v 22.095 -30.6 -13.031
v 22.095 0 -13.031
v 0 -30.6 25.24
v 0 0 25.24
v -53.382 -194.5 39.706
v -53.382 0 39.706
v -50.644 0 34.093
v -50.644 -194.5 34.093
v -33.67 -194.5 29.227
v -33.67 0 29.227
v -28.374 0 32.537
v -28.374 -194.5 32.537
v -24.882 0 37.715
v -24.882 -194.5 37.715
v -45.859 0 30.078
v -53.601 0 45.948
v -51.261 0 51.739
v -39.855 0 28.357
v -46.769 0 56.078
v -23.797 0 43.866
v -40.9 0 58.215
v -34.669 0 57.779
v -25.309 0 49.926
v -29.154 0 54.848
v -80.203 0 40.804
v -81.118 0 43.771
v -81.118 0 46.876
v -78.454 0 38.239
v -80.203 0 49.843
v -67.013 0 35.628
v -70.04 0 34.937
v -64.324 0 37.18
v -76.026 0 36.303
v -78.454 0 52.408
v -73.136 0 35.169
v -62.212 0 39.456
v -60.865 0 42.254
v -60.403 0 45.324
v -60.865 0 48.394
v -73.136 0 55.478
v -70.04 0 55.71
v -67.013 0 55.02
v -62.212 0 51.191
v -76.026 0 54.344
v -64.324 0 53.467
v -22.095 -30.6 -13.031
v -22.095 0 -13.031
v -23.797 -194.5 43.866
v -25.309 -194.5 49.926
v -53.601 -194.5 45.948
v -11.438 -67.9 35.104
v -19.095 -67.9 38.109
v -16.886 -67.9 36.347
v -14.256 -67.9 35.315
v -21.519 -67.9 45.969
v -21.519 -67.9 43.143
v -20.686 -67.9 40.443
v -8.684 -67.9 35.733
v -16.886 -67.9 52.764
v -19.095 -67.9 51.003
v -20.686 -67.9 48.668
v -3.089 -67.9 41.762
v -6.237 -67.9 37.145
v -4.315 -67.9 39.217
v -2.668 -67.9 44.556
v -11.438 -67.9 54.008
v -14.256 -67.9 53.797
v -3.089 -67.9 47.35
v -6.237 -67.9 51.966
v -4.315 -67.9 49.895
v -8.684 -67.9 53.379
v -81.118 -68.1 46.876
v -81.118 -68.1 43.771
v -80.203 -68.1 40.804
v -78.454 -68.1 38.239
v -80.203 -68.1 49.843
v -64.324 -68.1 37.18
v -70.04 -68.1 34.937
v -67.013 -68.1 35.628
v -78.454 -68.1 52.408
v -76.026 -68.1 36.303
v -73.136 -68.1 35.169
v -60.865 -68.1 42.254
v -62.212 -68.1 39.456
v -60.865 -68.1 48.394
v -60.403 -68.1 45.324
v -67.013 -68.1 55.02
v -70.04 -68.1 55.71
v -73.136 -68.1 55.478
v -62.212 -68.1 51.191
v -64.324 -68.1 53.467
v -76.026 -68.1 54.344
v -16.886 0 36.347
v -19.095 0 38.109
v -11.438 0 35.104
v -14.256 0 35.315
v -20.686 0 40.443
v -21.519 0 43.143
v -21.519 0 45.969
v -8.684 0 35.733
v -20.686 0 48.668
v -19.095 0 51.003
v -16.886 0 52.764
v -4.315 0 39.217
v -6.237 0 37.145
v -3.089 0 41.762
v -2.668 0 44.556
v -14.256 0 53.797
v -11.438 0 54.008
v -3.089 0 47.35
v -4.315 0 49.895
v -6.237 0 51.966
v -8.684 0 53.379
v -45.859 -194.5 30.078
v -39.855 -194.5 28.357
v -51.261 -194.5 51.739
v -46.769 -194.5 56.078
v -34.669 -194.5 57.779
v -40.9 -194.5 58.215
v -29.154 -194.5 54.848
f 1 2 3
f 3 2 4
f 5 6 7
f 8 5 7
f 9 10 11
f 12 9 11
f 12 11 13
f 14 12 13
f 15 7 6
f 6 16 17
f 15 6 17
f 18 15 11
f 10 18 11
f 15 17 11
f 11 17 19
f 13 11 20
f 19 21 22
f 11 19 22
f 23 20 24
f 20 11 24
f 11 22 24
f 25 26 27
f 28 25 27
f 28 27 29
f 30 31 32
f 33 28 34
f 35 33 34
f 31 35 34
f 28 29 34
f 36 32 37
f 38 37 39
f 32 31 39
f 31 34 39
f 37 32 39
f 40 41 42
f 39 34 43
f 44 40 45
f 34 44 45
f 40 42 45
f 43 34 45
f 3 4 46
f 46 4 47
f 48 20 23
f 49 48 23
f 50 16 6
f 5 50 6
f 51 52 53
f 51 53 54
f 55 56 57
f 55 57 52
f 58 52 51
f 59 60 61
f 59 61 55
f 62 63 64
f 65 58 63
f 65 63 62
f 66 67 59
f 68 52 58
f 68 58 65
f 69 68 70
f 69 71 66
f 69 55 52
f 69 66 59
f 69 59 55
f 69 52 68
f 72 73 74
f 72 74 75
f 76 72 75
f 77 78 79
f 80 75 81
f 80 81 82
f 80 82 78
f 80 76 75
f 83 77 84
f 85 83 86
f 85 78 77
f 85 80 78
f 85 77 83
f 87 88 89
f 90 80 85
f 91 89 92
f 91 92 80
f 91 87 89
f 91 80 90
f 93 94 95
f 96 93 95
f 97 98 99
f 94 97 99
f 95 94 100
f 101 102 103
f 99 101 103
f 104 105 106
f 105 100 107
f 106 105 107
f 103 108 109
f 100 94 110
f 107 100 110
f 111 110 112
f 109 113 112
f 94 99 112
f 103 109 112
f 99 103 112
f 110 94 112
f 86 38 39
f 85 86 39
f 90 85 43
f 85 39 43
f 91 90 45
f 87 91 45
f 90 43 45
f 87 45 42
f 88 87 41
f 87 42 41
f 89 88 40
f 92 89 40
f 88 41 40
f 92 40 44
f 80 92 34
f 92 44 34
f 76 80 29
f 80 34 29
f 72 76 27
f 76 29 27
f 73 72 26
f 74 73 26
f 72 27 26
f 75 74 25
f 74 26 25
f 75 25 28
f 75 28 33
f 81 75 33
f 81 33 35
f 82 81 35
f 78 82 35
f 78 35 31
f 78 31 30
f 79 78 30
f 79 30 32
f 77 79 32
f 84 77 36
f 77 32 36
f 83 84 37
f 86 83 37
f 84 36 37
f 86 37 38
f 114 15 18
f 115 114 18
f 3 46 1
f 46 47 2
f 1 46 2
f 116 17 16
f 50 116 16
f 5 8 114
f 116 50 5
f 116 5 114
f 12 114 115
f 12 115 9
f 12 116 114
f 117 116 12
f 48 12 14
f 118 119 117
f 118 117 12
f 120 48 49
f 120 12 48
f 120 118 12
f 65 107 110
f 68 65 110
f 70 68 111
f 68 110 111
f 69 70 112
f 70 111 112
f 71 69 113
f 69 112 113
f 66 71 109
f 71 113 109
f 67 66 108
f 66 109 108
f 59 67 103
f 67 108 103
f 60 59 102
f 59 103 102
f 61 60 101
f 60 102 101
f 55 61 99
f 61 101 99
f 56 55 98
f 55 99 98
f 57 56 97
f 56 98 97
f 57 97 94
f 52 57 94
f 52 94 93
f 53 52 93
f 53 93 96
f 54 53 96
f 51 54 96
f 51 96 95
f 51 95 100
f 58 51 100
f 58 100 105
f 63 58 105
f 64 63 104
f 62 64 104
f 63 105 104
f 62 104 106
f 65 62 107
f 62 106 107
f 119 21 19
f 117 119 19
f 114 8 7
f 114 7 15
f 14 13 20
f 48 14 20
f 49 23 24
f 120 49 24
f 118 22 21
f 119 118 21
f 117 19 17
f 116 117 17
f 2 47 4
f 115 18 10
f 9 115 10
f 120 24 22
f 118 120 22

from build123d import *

# Parameters (mm, degrees)
F1_DEPTH = 30.6
F3_DEPTH = 194.5
F4_R     = 10.415838
F5_DEPTH = 68.1
F6_R     = 9.478308
F7_DEPTH = 67.9


with BuildPart() as f1:
    # F0 (on Front) → F1 (new body)
    with BuildSketch(Plane.XZ):
        Polygon((0, 25.239646), (-22.095323, -13.030576), (22.095323, -13.030576), align=None)
    extrude(amount=F1_DEPTH)


with BuildPart() as f3:
    # F2 (on Front) → F3 (new body)
    with BuildSketch(Plane.XZ):
        Polygon((-28.373837, 32.536801), (-24.881561, 37.714999), (-23.797372, 43.865956), (-25.308735, 49.926113), (-29.154323, 54.847616), (-34.669197, 57.779491), (-40.899786, 58.214791), (-46.768765, 56.078248), (-51.261334, 51.73929), (-53.600687, 45.948163), (-53.382328, 39.706204), (-50.644014, 34.092705), (-45.859224, 30.078292), (-39.855292, 28.357092), (-33.670352, 29.226717), align=None)
    extrude(amount=F3_DEPTH)


with BuildPart() as f5:
    # F4 (on Front) → F5 (new body)
    with BuildSketch(Plane.XZ):
        with Locations((-70.81835, 45.323744)):
            Circle(F4_R)
    extrude(amount=F5_DEPTH)


with BuildPart() as f7:
    # F6 (on Front) → F7 (new body)
    with BuildSketch(Plane.XZ):
        with Locations((-12.146698, 44.555921)):
            Circle(F6_R)
    extrude(amount=F7_DEPTH)


solid = Compound([f1.part, f3.part, f5.part, f7.part])
